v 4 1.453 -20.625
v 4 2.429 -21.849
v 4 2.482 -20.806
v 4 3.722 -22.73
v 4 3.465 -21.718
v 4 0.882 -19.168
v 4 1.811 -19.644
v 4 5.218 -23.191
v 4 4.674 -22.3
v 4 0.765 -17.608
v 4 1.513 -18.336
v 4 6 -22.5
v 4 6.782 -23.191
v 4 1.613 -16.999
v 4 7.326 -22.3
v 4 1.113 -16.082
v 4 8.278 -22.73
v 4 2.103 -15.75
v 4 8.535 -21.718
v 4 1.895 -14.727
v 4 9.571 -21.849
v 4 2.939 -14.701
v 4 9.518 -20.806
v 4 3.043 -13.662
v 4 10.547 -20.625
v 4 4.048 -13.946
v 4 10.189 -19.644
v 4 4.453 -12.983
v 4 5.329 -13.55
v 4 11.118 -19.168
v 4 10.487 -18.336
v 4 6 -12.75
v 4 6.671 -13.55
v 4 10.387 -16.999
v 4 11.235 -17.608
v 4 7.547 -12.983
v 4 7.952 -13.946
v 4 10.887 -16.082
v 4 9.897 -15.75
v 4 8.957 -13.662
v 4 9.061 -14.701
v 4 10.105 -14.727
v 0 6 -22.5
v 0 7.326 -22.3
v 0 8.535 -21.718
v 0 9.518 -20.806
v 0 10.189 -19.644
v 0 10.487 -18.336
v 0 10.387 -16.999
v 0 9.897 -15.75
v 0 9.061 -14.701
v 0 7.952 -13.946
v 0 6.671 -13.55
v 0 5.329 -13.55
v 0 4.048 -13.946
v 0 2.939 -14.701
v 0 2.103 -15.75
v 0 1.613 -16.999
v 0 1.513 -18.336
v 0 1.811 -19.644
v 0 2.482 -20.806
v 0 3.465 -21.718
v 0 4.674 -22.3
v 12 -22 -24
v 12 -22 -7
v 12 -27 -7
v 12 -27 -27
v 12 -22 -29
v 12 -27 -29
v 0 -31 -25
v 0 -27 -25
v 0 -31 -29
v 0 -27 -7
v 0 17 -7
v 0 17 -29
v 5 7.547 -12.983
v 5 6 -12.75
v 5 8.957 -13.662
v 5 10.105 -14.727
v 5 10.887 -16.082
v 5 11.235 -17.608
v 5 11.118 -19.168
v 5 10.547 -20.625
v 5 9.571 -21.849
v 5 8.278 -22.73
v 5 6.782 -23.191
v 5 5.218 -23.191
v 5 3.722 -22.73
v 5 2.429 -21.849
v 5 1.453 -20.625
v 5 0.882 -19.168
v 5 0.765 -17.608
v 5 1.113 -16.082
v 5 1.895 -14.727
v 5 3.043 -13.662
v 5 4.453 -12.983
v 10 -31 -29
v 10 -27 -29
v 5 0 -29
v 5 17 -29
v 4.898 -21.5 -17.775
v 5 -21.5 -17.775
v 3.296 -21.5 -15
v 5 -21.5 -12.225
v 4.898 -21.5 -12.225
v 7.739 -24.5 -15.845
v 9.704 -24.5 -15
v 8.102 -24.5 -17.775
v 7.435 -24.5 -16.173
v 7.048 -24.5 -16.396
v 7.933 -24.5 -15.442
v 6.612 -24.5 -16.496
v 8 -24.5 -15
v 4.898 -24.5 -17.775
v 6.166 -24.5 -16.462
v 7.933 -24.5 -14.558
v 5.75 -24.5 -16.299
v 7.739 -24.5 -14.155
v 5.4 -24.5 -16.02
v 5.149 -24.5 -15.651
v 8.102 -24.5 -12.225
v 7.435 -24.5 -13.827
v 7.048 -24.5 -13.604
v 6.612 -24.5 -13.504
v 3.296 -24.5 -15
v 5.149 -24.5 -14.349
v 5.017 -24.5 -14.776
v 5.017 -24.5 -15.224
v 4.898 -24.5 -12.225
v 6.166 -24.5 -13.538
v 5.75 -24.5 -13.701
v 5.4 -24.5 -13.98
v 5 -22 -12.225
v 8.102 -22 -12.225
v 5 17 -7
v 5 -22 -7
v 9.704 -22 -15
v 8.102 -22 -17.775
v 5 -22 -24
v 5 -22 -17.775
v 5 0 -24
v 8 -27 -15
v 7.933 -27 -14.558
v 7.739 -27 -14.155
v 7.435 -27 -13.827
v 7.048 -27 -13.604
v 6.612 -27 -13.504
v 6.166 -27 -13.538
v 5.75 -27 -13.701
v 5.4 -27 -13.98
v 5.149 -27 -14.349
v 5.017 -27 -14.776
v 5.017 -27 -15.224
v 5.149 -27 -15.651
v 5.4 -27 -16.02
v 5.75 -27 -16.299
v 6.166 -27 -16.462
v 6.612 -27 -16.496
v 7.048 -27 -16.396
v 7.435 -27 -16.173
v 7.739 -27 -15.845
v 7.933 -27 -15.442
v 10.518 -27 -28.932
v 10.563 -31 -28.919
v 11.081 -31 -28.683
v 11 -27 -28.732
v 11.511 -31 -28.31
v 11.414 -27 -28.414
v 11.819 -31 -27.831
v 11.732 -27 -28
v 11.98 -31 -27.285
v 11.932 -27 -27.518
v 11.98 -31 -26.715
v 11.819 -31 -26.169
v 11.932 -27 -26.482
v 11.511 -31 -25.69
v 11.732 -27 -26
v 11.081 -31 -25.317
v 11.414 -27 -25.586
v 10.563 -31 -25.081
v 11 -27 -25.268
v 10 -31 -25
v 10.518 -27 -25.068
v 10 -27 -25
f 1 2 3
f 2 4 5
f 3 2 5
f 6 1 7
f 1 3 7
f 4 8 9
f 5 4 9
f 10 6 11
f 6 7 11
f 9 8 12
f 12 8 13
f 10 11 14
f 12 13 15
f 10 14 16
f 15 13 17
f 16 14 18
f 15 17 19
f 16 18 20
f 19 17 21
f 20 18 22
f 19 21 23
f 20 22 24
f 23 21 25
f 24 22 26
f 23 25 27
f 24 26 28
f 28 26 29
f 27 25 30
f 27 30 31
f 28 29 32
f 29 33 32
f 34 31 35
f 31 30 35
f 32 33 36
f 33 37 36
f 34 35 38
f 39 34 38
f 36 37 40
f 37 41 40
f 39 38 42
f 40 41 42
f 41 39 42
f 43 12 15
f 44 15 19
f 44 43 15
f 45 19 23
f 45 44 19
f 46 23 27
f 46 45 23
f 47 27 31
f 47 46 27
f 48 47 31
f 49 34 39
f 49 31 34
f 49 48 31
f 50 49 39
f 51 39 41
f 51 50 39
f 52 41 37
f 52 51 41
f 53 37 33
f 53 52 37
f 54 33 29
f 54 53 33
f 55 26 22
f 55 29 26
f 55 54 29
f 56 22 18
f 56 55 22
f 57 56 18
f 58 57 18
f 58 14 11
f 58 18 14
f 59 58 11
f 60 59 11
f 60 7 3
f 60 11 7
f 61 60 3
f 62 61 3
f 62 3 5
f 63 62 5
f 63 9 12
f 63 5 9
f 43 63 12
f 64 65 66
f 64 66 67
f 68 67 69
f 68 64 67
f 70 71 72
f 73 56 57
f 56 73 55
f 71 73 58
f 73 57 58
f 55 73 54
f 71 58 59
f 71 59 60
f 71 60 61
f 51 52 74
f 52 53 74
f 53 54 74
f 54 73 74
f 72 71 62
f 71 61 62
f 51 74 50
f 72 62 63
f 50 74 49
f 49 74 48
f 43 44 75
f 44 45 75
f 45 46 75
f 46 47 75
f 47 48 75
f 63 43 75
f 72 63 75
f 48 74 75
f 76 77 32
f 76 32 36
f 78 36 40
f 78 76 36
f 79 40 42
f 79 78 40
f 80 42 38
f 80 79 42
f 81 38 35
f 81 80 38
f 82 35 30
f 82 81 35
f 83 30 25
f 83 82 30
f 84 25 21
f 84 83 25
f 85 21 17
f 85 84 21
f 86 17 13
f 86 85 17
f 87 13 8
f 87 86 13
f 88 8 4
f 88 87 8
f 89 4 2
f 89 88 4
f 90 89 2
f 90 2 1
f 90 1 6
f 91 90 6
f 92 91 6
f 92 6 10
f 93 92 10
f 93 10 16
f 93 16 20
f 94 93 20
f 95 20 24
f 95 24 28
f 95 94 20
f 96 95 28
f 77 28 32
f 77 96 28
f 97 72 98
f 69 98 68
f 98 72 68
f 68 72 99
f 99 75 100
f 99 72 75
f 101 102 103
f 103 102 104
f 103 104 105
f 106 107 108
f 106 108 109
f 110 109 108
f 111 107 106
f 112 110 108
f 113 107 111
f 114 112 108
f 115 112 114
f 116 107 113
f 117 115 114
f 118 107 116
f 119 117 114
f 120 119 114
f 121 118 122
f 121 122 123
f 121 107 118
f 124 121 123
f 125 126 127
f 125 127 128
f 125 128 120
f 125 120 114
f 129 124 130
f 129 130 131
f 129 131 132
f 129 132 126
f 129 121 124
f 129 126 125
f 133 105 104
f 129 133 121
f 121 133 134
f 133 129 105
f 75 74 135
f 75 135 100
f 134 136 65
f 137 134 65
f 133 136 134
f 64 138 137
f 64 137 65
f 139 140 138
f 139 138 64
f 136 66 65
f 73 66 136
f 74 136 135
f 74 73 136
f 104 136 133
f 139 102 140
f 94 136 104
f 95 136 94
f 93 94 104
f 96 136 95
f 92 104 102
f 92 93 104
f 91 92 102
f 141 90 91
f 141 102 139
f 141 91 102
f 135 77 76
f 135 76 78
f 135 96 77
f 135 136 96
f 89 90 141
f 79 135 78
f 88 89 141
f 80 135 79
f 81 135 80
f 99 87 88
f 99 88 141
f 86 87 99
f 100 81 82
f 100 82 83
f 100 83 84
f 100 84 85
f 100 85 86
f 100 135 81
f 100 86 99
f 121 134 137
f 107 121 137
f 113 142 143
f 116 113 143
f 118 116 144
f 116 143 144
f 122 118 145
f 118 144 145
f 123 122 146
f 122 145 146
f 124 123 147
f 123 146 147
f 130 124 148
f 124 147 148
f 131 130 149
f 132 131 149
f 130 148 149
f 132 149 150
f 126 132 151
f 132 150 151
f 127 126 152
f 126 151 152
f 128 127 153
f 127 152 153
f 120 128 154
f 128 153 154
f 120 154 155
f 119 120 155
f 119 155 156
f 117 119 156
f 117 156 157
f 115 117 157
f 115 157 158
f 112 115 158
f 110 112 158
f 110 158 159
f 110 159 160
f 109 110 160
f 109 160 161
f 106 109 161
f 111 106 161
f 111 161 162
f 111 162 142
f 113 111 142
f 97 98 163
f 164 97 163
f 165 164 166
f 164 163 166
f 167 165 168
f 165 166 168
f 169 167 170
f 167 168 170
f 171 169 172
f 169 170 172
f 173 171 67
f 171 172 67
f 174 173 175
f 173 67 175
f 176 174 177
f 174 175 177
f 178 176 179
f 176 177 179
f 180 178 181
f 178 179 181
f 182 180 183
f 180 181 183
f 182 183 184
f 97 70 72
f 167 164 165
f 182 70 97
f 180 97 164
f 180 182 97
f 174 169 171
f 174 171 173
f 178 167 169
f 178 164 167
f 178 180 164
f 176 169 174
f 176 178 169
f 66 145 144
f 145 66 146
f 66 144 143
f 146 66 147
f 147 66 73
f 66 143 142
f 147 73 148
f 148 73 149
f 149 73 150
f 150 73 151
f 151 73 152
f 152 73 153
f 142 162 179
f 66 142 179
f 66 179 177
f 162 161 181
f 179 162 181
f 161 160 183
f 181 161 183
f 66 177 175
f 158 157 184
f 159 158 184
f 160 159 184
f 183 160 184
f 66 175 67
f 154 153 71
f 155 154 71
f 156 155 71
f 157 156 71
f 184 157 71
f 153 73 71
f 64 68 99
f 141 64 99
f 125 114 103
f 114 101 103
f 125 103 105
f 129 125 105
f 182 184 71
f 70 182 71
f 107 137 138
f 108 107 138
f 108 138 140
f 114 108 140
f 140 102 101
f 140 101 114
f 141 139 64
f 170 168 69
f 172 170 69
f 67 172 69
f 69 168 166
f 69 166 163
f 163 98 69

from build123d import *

# Parameters (mm, degrees)
SKETCH_1_W               = 40
SKETCH_1_H               = 44
SKETCH_1_R               = 4.5
EXTRUDE_1_DEPTH          = 5
SKETCH_2_R               = 5.25
CUT_EXTRUDE_1_DEPTH      = 1
SKETCH_3_W               = 18
SKETCH_3_H               = 44
CUT_EXTRUDE_2_DEPTH      = 6
SKETCH_4_R               = 4.5
EXTRUDE_2_DEPTH          = 5
SKETCH_5_W               = 22
SKETCH_5_H               = 5
EXTRUDE_3_DEPTH          = 7
EXTRUDE_4_DEPTH          = 4
SKETCH_7_R               = 1.5
CUT_EXTRUDE_3_DEPTH      = 5
CUT_EXTRUDE_4_DEPTH      = 0.5
CUT_EXTRUDE_4_DEPTH_BACK = 2.5
EXTRUDE_5_DEPTH          = 5


with BuildPart() as part:
    # 草图1 → 凸台-拉伸1 (new body)
    with BuildSketch(Plane(origin=(0, 0, 0), x_dir=(0, 0, -1), z_dir=(1, 0, 0))):
        with Locations((9, -5)):
            Rectangle(SKETCH_1_W, SKETCH_1_H)
        Circle(SKETCH_1_R, mode=Mode.SUBTRACT)
        with Locations((18, 6)):
            Circle(SKETCH_1_R, mode=Mode.SUBTRACT)
        with Locations((11.543885882, -13.351449313)):
            Circle(SKETCH_1_R, mode=Mode.SUBTRACT)
    extrude(amount=EXTRUDE_1_DEPTH)

    # 草图2 → 切除-拉伸1 (cut)
    with BuildSketch(Plane.ZY.offset(-5)):
        with Locations((-18, 6)):
            Circle(SKETCH_2_R)
        Circle(SKETCH_2_R)
    extrude(amount=CUT_EXTRUDE_1_DEPTH, mode=Mode.SUBTRACT)

    # 草图3 → 切除-拉伸2 (cut, through all)
    with BuildSketch(Plane(origin=(5, 0, 0), x_dir=(0, 0, -1), z_dir=(1, 0, 0))):
        with Locations((-2, -5)):
            Rectangle(SKETCH_3_W, SKETCH_3_H)
    extrude(amount=-CUT_EXTRUDE_2_DEPTH, mode=Mode.SUBTRACT)

    # 草图4 → 凸台-拉伸2 (add, through all)
    with BuildSketch(Plane(origin=(5, 0, 0), x_dir=(0, 0, -1), z_dir=(1, 0, 0))):
        with Locations((11.543885882, -13.351449313)):
            Circle(SKETCH_4_R)
    extrude(amount=-EXTRUDE_2_DEPTH)

    # 草图5 → 凸台-拉伸3 (add)
    with BuildSketch(Plane(origin=(5, 0, 0), x_dir=(0, 0, -1), z_dir=(1, 0, 0))):
        with Locations((18, -24.5)):
            Rectangle(SKETCH_5_W, SKETCH_5_H)
    extrude(amount=EXTRUDE_3_DEPTH)

    # 草图6 → 凸台-拉伸4 (add)
    with BuildSketch(Plane.XZ.offset(27)):
        with BuildLine():
            Line((0, -29), (10, -29))
            ThreePointArc((10, -29), (12, -27), (10, -25))
            Line((10, -25), (0, -25))
            Line((0, -25), (0, -29))
        make_face()
    extrude(amount=EXTRUDE_4_DEPTH)

    # 草图7 → 切除-拉伸3 (cut)
    with BuildSketch(Plane.XZ.offset(27)):
        with Locations((6.5, -15)):
            Circle(SKETCH_7_R)
    extrude(amount=-CUT_EXTRUDE_3_DEPTH, mode=Mode.SUBTRACT)

    # 草图8 → 切除-拉伸4 (cut, two sides)
    with BuildSketch(Plane(origin=(0, -22, 0), x_dir=(-1, 0, 0), z_dir=(0, 1, 0))) as cut_extrude_4_sk:
        Polygon((-9.704293994, -15), (-8.102146997, -17.775), (-4.897853003, -17.775), (-3.295706006, -15), (-4.897853003, -12.225), (-8.102146997, -12.225), align=None)
    extrude(amount=CUT_EXTRUDE_4_DEPTH, mode=Mode.SUBTRACT)
    extrude(cut_extrude_4_sk.sketch, amount=-CUT_EXTRUDE_4_DEPTH_BACK, mode=Mode.SUBTRACT)

    # 草图9 → 凸台-拉伸5 (add)
    with BuildSketch(Plane(origin=(0, 0, -29), x_dir=(-1, 0, 0), z_dir=(0, 0, -1))):
        Polygon((-5, -22), (-12, -22), (-5, 0), align=None)
    extrude(amount=-EXTRUDE_5_DEPTH)


solid = part.part
